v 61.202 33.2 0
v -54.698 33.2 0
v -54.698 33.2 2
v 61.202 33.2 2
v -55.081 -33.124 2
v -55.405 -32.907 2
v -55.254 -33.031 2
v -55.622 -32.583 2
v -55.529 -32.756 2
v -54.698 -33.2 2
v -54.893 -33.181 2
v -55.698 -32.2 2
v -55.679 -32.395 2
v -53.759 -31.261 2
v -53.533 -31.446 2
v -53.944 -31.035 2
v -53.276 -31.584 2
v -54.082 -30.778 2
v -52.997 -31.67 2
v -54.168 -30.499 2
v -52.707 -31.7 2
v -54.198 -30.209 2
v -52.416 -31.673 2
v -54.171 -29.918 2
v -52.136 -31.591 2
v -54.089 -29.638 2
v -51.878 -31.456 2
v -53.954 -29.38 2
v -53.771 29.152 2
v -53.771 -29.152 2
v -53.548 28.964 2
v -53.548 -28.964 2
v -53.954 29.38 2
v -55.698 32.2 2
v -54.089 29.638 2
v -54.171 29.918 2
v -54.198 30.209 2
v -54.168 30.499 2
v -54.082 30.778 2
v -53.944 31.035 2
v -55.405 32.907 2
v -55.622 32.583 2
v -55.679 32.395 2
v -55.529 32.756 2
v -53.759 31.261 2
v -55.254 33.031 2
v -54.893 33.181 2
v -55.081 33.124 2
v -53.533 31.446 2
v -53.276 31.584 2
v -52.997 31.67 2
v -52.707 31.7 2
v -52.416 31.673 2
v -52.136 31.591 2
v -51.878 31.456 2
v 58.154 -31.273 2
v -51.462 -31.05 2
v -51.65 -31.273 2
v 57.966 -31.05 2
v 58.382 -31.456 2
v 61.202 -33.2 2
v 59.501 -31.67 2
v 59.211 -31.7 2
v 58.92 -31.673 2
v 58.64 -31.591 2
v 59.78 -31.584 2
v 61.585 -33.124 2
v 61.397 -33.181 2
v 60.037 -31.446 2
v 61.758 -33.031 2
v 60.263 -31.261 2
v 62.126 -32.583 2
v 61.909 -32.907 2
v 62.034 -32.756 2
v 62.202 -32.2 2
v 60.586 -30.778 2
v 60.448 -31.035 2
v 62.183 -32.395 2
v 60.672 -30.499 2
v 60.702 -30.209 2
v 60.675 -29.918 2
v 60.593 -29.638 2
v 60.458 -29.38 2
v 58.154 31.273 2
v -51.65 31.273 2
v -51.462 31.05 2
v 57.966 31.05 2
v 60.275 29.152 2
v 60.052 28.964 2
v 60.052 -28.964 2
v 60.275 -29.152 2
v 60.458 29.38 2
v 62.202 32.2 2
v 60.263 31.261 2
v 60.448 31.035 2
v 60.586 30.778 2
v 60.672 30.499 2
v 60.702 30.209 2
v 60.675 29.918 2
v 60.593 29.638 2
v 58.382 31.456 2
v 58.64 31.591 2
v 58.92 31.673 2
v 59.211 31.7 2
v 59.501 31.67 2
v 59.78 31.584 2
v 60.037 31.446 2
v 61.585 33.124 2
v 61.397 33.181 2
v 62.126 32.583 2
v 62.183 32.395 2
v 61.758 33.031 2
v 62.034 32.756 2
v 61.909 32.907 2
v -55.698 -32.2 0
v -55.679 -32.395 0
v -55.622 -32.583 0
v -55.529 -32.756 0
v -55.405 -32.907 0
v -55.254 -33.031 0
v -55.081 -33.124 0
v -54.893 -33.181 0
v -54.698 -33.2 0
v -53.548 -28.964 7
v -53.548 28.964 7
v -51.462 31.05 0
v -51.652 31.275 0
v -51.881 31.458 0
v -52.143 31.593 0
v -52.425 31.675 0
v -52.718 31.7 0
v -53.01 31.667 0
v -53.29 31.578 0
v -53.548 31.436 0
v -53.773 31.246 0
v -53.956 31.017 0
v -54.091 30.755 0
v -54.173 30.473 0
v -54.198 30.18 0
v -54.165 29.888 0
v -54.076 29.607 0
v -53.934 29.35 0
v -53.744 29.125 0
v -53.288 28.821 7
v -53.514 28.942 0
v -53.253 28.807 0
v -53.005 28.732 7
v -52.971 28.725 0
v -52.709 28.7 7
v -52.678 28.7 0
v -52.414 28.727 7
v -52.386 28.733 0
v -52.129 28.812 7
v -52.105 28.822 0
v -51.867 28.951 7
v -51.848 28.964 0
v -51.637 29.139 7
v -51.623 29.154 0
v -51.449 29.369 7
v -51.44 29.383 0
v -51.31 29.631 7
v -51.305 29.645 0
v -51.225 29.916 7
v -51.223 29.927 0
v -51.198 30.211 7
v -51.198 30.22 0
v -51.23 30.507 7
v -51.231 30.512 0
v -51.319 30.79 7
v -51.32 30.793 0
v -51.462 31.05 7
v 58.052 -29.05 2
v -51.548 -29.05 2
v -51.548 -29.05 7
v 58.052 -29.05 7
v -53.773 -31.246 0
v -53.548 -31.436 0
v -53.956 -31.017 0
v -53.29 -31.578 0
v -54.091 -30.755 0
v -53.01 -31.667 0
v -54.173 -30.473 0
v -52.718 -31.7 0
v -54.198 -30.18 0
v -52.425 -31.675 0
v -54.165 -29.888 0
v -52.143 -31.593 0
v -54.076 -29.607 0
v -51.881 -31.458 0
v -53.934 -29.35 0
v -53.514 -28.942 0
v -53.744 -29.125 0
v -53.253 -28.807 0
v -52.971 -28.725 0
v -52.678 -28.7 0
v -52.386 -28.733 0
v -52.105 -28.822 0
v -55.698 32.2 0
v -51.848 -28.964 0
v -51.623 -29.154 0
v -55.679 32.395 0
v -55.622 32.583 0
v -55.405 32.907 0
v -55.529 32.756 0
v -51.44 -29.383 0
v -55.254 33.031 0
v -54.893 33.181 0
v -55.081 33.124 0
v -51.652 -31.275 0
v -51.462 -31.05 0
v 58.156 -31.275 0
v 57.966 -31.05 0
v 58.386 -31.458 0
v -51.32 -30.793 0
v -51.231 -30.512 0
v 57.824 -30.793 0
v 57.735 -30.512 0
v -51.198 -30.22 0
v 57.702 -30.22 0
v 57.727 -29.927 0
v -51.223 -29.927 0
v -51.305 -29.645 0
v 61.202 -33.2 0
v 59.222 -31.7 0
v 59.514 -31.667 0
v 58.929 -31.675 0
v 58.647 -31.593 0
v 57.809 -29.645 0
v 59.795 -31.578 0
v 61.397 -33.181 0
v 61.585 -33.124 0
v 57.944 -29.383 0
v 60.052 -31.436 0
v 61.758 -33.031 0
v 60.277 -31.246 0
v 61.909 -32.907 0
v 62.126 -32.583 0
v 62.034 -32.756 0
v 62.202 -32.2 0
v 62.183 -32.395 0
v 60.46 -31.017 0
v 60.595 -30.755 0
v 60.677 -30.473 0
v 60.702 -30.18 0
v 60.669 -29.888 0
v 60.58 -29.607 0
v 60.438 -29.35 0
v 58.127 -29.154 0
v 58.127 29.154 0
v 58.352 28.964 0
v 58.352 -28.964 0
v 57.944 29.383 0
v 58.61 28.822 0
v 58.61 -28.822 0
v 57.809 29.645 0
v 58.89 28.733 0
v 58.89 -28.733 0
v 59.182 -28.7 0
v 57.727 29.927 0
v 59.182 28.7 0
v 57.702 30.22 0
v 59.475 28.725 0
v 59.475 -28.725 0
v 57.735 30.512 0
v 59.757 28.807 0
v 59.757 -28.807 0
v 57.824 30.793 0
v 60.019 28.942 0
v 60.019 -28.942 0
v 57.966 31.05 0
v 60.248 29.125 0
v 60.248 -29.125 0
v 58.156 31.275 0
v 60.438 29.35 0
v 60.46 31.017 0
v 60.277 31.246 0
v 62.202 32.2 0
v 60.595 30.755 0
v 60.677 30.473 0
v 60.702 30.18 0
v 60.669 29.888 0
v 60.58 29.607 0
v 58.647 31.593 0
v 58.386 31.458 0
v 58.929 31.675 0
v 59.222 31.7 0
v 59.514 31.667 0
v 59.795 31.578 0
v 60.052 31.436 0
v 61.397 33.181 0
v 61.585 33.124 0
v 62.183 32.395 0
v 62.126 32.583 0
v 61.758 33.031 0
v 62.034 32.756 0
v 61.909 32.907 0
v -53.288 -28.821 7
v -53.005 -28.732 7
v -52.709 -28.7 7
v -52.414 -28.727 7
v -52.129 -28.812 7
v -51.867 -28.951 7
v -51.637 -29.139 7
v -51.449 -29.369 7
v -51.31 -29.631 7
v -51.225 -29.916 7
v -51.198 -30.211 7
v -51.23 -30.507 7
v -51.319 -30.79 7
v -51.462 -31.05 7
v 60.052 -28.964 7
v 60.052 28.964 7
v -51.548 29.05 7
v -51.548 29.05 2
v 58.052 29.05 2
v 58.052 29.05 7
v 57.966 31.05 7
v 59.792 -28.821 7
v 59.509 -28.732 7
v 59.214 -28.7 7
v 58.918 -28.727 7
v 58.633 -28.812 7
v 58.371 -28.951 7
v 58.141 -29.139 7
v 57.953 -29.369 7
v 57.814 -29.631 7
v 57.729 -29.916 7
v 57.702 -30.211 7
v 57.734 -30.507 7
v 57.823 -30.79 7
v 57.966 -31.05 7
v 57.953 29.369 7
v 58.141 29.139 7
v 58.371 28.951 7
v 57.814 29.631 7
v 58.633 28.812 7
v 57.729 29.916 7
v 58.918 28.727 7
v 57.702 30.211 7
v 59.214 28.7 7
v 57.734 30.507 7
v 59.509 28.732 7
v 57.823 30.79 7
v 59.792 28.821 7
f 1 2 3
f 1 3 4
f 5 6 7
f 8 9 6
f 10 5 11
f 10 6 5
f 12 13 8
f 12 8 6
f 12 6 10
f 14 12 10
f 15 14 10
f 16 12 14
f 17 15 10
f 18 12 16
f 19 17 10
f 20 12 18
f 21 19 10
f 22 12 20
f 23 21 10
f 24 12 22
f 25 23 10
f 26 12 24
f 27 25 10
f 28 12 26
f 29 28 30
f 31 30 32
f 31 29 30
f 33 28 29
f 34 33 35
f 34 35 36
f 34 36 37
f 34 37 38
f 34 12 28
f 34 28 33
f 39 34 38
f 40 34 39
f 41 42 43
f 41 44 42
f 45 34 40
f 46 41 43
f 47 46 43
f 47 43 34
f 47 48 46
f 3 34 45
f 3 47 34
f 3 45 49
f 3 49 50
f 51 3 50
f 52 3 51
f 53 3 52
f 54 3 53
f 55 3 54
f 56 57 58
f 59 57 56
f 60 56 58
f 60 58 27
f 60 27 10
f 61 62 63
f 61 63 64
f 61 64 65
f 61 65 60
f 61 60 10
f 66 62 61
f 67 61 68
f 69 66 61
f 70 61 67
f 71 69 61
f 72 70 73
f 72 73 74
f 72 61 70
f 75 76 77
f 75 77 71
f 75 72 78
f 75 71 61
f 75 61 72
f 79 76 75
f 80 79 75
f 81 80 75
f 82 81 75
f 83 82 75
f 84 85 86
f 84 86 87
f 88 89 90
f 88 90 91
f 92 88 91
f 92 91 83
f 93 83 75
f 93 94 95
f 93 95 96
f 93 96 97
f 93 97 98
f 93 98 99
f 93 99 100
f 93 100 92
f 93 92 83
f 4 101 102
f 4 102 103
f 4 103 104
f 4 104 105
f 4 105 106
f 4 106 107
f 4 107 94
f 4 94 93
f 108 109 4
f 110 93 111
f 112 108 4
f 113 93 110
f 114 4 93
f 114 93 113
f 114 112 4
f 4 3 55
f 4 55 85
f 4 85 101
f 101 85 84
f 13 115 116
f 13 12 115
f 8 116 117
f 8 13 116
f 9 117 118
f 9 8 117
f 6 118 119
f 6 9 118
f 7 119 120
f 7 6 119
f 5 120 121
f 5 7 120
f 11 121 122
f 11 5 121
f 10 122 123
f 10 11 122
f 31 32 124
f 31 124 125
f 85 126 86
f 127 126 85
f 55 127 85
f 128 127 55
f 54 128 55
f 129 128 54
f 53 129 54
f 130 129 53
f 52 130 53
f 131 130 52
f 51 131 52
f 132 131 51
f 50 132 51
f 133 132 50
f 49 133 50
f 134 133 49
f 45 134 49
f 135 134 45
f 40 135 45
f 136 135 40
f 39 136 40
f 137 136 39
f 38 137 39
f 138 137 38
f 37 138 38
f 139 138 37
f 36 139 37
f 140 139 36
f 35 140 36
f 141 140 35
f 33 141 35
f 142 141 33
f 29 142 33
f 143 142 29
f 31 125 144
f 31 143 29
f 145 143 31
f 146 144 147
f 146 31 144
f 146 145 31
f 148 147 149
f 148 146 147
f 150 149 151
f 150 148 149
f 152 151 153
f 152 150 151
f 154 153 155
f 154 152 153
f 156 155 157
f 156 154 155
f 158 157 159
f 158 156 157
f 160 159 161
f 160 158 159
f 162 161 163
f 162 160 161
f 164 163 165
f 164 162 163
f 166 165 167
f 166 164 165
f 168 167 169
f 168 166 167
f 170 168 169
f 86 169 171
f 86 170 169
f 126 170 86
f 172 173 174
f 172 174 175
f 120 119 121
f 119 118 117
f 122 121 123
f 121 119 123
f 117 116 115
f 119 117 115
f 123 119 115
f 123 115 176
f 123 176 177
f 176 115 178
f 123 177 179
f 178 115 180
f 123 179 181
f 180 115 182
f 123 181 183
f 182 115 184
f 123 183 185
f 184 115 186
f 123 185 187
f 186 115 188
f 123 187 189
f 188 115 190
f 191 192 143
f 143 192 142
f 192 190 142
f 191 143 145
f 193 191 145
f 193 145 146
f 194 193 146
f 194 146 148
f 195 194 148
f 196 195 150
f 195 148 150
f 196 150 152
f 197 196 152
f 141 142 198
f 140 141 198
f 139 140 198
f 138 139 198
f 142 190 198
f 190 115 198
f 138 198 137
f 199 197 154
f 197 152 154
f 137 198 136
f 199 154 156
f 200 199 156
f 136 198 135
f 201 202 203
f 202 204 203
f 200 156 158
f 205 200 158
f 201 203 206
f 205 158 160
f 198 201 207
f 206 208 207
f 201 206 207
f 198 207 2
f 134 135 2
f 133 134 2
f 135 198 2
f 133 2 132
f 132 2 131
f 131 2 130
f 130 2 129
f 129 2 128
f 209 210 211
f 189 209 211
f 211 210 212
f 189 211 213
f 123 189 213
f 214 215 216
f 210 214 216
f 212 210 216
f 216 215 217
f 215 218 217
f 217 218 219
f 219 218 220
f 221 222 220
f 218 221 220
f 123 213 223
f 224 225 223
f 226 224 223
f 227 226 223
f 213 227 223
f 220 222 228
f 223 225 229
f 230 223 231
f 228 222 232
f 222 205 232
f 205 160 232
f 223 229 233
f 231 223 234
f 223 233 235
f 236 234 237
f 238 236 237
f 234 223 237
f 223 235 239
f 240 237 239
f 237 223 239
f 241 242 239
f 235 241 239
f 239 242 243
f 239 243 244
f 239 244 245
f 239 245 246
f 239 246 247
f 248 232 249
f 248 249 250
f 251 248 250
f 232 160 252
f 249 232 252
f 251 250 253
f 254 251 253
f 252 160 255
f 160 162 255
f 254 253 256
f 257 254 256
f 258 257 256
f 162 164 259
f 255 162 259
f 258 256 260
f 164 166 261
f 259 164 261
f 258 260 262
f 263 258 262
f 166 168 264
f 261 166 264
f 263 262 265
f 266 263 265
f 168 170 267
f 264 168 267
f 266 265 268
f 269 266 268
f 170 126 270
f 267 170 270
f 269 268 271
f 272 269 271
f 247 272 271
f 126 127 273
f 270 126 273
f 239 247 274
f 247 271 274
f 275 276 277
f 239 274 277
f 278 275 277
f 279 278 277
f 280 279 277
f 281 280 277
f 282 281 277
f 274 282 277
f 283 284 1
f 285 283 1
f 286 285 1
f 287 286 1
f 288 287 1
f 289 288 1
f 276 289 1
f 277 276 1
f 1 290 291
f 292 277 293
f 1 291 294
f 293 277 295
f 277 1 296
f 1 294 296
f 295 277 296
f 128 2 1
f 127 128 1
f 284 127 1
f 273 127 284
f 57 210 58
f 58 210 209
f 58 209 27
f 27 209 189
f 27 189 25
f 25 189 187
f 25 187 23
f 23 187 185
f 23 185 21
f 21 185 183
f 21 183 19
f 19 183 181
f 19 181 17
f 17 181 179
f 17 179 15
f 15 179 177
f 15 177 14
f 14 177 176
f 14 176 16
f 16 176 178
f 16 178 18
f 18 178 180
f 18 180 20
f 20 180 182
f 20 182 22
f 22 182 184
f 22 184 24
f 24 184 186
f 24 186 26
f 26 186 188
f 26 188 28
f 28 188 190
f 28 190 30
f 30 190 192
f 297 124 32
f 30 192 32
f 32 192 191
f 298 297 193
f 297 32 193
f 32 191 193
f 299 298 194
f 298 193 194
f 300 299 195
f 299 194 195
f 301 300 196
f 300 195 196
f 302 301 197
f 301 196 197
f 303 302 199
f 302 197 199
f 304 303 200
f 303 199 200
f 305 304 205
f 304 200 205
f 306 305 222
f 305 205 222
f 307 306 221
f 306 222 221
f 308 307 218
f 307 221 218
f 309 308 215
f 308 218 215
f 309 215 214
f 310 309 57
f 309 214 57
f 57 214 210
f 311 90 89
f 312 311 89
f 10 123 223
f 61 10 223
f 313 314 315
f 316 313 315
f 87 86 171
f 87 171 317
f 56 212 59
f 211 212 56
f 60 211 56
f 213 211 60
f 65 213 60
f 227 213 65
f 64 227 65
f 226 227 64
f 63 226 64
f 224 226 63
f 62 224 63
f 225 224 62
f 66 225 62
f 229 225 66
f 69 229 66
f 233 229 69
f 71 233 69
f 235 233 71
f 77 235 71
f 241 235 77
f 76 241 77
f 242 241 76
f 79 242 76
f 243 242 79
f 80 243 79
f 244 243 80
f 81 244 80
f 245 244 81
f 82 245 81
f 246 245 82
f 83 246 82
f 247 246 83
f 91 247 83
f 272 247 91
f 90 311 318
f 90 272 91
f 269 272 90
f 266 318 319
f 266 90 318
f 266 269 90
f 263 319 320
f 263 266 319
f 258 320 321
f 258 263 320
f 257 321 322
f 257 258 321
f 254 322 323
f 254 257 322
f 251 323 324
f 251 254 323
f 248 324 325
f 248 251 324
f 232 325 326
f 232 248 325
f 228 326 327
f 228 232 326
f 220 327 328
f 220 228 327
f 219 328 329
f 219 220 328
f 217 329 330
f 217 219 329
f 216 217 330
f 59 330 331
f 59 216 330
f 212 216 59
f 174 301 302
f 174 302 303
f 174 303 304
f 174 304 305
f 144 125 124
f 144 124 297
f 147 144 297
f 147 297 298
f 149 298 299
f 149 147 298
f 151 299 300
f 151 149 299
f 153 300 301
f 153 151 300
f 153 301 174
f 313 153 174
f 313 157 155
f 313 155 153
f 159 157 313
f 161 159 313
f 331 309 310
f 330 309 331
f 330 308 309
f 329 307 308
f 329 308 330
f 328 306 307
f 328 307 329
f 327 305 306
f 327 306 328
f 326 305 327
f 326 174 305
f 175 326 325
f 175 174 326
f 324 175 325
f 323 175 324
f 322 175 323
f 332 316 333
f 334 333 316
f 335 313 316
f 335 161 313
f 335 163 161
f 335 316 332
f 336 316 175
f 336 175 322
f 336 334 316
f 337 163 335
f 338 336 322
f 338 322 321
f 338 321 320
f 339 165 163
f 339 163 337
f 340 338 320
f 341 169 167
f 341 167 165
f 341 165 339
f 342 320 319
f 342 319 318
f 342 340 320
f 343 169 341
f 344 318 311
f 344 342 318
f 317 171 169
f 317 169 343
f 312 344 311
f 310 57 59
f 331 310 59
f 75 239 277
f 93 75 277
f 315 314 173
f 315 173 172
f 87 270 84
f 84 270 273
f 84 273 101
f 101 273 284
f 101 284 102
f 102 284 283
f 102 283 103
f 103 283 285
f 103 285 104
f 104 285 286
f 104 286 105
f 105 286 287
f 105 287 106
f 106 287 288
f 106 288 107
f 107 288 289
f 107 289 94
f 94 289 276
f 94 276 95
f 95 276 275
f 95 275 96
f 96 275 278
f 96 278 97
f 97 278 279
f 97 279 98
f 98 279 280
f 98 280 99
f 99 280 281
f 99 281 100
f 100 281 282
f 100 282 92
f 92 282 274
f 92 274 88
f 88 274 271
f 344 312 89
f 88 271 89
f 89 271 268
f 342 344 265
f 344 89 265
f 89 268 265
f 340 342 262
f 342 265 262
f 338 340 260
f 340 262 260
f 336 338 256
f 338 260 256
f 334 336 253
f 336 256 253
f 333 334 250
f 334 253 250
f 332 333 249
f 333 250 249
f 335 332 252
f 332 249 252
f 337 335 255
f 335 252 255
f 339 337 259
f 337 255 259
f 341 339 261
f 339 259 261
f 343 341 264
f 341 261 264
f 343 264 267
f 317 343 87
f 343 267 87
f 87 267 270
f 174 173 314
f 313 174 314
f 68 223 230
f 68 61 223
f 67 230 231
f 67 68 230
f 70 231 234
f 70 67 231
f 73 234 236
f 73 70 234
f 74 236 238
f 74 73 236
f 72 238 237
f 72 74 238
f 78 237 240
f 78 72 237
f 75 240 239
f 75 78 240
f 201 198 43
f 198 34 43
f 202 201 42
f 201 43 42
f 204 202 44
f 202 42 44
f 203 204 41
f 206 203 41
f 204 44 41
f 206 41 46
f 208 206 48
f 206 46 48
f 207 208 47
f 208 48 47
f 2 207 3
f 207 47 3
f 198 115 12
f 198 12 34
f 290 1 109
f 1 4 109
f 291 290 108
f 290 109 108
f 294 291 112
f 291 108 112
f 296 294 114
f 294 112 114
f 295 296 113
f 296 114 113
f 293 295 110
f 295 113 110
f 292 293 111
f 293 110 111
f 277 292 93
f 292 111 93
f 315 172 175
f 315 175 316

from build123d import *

# Parameters (mm, degrees)
SKETCH1_W                                  = 117.9
SKETCH1_H                                  = 66.4
BOSS_EXTRUDE1_DEPTH                        = 2
SKETCH2_W                                  = 113.6
SKETCH2_H                                  = 62.1
SKETCH2_W_2                                = 109.6
SKETCH2_H_2                                = 58.1
BOSS_EXTRUDE2_DEPTH                        = 5
SKETCH3_R                                  = 1.5
CUT_EXTRUDE2_DEPTH                         = 71.854336818
MIRROR3_AT_THE_SECOND_PLANE_COPY_1_SKETC_R = 1.5
MIRROR3_AT_THE_SECOND_PLANE_COPY_1_DEPTH   = 71.854336818
FILLET1_R                                  = 1


with BuildPart() as part:
    # Sketch1 → Boss-Extrude1 (new body)
    with BuildSketch(Plane.XY):
        with Locations((3.252066252, 0)):
            Rectangle(SKETCH1_W, SKETCH1_H)
    extrude(amount=BOSS_EXTRUDE1_DEPTH)

    # Sketch2 → Boss-Extrude2 (add)
    with BuildSketch(Plane.XY.offset(2)):
        with Locations((3.252066252, 0)):
            Rectangle(SKETCH2_W, SKETCH2_H)
        with Locations((3.252066252, 0)):
            Rectangle(SKETCH2_W_2, SKETCH2_H_2, mode=Mode.SUBTRACT)
    extrude(amount=BOSS_EXTRUDE2_DEPTH)

    # Sketch3 → Cut-Extrude2 (cut, symmetric)
    with BuildSketch(Plane(origin=(0, 0, 0), x_dir=(-1, 0, 0), z_dir=(0, 0, -1))):
        with Locations(Location((-59.202066252, 30.2, 0), (0, 0, 34.518107841))):
            Circle(SKETCH3_R)
    cut_extrude2 = extrude(amount=CUT_EXTRUDE2_DEPTH, both=True, mode=Mode.SUBTRACT)

    # Mirror2: Cut-Extrude2 across plane
    add(cut_extrude2.mirror(Plane.ZX), mode=Mode.SUBTRACT)

    # Mirror3: Cut-Extrude2 across plane
    add(cut_extrude2.mirror(Plane.ZX), mode=Mode.SUBTRACT)

    # Mirror3 at the second plane: Cut-Extrude2 across plane
    add(cut_extrude2.mirror(Plane(origin=(3.252066252, 0, 0), x_dir=(0, 0, 1), z_dir=(1, 0, 0))), mode=Mode.SUBTRACT)

    # Mirror3 at the second plane copy 1 sketc → Mirror3 at the second plane copy 1 (cut, symmetric)
    with BuildSketch(Plane(origin=(6.504132503, 0, 0), x_dir=(1, 0, 0), z_dir=(0, 0, -1))):
        with Locations(Location((-59.202066252, 30.2, 0), (0, 0, 34.518107841))):
            Circle(MIRROR3_AT_THE_SECOND_PLANE_COPY_1_SKETC_R)
    extrude(amount=MIRROR3_AT_THE_SECOND_PLANE_COPY_1_DEPTH, both=True, mode=Mode.SUBTRACT)

    # Fillet1
    fillet1_edges = [part.edges().sort_by_distance(p)[0] for p in [
        (62.202066252, -33.2, 1),
        (-55.697933748, -33.2, 1),
        (-55.697933748, 33.2, 1),
        (62.202066252, 33.2, 1),
    ]]
    fillet(fillet1_edges, radius=FILLET1_R)


solid = part.part
